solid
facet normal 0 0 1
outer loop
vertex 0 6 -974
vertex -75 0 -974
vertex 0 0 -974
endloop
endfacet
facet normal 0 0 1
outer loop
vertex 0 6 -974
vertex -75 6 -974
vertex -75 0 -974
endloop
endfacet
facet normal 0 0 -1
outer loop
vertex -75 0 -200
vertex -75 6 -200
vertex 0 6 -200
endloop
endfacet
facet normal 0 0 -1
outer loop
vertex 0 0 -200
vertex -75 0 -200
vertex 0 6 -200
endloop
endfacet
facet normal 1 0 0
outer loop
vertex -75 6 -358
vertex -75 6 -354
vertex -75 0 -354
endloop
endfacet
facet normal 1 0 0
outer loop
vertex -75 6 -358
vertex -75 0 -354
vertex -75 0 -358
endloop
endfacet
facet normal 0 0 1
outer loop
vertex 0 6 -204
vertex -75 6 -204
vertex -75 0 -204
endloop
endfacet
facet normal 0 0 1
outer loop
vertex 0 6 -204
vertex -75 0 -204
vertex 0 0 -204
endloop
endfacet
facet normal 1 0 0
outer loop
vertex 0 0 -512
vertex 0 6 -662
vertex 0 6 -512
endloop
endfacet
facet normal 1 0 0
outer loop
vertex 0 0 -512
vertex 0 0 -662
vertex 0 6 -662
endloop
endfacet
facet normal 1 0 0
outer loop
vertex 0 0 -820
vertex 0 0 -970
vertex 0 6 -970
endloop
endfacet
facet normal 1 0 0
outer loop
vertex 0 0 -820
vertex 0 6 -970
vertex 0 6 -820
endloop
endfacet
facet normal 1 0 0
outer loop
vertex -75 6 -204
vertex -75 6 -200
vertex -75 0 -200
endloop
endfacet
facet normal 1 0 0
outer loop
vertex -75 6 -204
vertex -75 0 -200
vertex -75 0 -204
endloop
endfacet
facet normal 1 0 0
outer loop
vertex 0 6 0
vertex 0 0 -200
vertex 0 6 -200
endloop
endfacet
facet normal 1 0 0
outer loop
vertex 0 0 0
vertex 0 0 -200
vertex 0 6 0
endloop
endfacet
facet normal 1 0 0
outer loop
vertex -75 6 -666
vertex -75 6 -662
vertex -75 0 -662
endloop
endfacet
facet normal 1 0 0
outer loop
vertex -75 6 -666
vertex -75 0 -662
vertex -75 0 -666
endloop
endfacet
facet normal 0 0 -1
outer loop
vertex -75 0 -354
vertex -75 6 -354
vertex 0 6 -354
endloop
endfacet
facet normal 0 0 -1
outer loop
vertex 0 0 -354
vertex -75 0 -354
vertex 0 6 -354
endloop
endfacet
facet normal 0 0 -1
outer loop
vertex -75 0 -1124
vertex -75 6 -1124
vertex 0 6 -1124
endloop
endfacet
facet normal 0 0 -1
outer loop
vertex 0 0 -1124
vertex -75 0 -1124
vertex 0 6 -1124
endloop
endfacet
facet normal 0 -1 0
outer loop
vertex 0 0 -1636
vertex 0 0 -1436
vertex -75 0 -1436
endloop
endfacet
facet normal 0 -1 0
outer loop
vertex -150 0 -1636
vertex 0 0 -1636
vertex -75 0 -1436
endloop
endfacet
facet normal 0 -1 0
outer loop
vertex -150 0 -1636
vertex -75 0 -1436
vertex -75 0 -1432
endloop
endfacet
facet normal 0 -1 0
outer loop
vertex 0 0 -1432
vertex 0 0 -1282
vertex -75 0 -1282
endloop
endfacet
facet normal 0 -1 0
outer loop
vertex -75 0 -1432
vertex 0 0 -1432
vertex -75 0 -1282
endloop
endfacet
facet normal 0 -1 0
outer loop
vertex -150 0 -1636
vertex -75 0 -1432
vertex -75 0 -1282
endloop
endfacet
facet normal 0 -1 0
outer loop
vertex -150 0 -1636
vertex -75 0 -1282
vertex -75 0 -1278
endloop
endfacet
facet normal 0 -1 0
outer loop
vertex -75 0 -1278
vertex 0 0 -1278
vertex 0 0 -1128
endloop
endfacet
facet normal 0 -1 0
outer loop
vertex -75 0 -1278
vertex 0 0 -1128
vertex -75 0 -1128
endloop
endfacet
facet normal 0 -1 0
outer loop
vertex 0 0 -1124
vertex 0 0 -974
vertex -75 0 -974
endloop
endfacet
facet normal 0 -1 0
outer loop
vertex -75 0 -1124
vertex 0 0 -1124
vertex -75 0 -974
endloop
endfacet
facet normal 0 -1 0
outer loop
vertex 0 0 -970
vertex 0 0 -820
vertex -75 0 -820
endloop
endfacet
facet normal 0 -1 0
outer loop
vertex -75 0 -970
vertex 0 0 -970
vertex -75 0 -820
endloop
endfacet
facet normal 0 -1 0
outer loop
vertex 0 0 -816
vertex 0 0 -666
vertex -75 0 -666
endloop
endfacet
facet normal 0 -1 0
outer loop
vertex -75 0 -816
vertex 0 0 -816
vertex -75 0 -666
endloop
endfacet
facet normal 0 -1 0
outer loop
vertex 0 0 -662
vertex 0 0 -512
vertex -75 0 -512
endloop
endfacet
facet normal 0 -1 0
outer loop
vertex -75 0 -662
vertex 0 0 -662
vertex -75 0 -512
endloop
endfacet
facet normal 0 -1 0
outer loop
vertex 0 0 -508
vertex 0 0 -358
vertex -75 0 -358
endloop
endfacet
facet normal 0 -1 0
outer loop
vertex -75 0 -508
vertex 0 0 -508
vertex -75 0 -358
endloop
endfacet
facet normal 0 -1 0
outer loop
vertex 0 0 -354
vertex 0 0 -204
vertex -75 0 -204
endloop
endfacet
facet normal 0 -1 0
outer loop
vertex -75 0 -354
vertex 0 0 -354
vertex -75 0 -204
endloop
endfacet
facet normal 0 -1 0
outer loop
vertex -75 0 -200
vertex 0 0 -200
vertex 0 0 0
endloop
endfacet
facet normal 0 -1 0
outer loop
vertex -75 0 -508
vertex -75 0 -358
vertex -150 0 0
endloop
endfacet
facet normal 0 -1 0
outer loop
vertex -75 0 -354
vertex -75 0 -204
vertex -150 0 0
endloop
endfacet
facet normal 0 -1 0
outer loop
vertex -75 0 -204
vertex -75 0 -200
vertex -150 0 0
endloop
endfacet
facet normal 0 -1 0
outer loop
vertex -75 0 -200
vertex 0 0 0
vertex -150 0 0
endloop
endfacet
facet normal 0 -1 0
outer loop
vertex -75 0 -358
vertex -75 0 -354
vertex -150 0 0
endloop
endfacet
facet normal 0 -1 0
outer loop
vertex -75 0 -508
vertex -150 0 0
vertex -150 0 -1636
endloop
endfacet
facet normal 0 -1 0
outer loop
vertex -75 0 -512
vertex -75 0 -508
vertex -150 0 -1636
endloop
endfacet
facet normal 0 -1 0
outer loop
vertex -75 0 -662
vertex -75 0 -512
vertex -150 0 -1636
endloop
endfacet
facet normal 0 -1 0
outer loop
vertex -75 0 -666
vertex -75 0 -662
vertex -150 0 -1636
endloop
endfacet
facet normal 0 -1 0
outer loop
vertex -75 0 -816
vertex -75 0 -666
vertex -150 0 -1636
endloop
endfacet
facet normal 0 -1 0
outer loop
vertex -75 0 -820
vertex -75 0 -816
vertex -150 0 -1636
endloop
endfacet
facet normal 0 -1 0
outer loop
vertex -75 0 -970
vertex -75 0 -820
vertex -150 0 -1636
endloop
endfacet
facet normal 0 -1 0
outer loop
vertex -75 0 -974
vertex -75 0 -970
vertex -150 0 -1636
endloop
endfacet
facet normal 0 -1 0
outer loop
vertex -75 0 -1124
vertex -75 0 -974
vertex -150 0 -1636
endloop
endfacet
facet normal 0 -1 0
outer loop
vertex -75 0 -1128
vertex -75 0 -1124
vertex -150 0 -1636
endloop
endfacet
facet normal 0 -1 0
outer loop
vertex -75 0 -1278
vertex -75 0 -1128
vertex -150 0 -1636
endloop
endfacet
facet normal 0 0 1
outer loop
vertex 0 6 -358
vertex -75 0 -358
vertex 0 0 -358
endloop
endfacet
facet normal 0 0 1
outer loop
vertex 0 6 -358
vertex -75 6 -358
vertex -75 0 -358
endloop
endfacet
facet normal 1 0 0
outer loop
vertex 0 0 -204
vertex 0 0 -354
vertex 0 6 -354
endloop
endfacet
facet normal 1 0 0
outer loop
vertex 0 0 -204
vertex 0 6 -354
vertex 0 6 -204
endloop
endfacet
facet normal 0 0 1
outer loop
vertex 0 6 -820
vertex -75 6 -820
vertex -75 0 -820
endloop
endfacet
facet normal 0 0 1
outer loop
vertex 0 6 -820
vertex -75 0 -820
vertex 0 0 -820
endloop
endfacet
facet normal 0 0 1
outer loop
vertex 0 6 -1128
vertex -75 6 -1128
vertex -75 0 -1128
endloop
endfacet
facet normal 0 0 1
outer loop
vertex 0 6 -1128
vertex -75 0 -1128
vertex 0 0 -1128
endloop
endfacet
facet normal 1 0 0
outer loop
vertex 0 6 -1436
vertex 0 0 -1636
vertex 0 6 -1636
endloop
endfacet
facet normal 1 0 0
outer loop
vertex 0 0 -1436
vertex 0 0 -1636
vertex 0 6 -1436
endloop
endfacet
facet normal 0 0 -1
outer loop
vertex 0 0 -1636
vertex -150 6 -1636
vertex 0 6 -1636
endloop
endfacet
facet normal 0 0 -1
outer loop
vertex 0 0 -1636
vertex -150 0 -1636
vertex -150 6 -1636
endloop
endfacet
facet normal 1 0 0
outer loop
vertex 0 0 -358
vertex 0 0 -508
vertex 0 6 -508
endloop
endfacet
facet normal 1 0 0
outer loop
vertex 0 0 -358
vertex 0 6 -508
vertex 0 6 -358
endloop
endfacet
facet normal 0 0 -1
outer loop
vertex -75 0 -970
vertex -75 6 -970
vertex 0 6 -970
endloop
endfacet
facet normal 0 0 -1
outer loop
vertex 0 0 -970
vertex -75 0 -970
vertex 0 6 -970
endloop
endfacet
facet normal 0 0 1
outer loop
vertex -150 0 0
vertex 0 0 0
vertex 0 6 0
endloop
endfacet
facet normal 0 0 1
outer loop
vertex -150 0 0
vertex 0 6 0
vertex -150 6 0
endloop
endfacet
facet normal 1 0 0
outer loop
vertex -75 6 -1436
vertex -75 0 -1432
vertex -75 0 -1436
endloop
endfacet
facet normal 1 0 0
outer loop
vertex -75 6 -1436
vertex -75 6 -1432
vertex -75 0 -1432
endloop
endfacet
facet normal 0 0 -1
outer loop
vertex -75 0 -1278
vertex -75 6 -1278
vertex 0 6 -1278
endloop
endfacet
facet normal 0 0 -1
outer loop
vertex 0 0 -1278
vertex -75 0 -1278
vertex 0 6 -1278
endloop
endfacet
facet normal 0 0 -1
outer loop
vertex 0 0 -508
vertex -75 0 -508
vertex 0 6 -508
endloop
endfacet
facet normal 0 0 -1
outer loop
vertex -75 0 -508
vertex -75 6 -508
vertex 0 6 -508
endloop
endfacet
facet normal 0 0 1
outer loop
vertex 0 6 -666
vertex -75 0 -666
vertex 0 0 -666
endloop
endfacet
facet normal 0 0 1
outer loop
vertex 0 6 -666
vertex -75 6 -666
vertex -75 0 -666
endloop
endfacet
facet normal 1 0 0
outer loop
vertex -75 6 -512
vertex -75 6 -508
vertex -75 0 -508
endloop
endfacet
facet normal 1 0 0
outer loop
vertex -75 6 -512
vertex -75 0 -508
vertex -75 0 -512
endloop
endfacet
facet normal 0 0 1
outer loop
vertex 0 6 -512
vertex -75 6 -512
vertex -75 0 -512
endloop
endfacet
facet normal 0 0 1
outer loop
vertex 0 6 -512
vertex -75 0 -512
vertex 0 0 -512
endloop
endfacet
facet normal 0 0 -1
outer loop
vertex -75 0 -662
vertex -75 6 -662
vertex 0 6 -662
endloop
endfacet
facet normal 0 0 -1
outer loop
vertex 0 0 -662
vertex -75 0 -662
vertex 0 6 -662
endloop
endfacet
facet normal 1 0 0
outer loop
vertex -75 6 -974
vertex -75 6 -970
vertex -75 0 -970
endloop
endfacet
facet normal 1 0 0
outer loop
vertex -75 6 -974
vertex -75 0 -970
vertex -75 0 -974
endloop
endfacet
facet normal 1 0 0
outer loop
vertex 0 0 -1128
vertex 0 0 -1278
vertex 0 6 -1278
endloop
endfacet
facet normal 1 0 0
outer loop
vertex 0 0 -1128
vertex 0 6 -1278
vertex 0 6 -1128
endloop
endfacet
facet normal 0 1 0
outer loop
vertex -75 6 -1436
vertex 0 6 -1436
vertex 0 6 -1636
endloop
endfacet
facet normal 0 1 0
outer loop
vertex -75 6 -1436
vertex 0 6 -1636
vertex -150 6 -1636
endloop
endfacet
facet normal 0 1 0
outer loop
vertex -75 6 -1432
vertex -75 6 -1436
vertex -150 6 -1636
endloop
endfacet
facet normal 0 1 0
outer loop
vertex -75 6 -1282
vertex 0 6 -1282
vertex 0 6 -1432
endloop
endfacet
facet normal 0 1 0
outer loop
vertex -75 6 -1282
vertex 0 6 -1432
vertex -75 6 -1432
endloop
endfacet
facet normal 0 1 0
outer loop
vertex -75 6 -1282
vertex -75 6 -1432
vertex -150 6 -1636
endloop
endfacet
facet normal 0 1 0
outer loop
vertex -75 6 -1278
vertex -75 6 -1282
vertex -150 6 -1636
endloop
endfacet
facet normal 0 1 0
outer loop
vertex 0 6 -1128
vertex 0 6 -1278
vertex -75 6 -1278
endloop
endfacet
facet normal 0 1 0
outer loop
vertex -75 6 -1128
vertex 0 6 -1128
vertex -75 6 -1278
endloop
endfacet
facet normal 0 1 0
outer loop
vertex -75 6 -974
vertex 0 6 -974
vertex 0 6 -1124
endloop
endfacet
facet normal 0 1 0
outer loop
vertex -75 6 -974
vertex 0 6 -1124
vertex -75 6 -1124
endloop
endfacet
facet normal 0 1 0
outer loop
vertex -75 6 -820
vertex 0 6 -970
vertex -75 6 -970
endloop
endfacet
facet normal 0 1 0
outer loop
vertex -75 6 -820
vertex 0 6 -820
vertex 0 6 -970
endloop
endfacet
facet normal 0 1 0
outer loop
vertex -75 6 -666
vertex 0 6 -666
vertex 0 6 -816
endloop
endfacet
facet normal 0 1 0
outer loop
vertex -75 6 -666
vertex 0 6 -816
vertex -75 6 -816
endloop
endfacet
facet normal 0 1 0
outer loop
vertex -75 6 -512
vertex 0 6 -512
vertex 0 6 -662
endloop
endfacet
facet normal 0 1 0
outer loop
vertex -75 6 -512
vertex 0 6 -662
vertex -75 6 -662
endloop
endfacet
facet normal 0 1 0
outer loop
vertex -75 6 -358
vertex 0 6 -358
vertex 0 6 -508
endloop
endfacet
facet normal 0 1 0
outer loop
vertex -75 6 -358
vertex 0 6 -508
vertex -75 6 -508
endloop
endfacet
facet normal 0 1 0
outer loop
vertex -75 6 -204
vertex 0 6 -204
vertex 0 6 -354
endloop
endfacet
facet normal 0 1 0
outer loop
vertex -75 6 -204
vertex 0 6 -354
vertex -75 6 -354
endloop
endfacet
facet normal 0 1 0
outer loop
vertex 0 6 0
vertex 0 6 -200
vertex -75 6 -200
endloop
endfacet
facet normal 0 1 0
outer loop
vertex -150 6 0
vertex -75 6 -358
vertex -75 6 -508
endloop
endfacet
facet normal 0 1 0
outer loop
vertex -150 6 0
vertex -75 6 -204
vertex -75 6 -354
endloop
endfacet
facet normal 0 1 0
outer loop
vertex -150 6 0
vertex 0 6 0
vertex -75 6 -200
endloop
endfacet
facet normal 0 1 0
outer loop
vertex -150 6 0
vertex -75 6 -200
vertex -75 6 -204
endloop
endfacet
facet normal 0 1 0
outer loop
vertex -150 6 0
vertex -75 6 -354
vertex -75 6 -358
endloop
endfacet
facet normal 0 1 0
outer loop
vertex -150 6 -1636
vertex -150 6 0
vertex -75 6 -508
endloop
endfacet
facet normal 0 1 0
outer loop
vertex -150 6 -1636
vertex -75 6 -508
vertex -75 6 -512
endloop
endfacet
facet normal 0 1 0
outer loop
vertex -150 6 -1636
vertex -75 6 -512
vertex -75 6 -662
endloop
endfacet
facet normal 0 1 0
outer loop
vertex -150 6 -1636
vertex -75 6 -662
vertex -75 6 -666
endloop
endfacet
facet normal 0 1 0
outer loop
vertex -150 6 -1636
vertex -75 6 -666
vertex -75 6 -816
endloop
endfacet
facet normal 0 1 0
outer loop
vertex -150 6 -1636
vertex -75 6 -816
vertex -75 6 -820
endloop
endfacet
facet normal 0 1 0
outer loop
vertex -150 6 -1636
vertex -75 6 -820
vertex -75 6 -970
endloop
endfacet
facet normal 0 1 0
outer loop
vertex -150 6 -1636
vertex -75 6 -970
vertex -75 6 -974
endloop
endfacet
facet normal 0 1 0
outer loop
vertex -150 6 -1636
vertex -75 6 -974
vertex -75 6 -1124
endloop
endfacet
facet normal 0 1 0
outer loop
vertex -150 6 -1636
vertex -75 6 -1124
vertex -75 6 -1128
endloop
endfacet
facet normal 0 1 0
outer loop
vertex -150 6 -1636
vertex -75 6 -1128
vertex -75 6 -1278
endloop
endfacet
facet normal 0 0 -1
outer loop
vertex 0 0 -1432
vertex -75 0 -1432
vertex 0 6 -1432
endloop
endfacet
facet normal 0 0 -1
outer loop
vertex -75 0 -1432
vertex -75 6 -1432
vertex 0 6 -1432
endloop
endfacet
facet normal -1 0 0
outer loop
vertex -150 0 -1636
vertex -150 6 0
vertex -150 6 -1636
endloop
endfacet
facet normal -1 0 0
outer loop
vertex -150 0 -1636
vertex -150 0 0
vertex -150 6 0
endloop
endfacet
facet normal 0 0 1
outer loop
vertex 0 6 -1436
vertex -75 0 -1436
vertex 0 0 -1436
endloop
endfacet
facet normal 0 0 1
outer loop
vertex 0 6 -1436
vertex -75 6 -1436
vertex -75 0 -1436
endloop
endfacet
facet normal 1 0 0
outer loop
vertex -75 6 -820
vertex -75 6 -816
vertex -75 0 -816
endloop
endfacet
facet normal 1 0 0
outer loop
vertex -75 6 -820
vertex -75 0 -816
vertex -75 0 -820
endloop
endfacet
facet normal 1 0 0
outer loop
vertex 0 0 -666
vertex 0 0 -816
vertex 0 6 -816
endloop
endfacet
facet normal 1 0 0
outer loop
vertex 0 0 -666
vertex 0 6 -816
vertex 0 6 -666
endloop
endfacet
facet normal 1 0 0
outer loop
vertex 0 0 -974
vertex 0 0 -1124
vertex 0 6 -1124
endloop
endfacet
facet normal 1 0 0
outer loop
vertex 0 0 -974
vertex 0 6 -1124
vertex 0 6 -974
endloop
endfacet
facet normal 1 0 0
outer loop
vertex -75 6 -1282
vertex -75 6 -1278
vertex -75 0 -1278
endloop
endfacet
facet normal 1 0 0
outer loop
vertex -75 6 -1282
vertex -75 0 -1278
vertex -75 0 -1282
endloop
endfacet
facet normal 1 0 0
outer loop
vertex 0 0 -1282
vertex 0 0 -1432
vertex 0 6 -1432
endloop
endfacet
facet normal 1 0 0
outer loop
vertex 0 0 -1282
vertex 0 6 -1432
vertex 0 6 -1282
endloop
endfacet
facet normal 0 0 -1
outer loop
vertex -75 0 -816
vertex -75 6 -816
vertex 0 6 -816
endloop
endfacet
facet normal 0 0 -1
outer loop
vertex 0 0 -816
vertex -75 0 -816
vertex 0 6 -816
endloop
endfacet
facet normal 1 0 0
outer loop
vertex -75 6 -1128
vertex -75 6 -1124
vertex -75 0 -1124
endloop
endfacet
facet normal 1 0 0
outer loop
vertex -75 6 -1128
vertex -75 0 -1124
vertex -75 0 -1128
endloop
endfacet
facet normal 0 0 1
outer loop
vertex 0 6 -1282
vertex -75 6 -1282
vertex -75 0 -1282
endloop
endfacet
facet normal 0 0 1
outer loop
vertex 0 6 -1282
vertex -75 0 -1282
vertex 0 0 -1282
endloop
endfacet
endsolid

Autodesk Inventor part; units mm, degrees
ref_plane "YZ Plane" through (0, 0, 0) normal (1, 0, 0) x (0, 1, 0)
ref_plane "XZ Plane" through (0, 0, 0) normal (0, 1, 0) x (-1, 0, 0)
ref_plane "XY Plane" through (0, 0, 0) normal (0, 0, 1) x (1, 0, 0)
sketch "Sketch1" plane through (0, 0, 0) normal (0, 1, 0) x (-1, 0, 0)
  line L0 (0, 0) -> (150, 0)
  line L1 (150, 0) -> (150, -1636)
  line L2 (150, -1636) -> (0, -1636)
  line L3 (0, -1636) -> (0, 0)
  dimension "d0" = 150
  dimension "d1" = 1636
extrude "Extrusion1" add sketch "Sketch1" along normal blind 6
sketch "Sketch2" plane through (0, 6, 0) normal (0, 1, 0) x (1, 0, 0)
  line L0 (-150, 200) -> (0, 200)
  line L1 (-150, 0) -> (0, 0) projected
  line L2 (-150, 204) -> (0, 204)
  line L3 (-75, 200) -> (-75, 204)
  line L4 (-150, 354) -> (0, 354)
  line L5 (-150, 358) -> (0, 358)
  line L6 (-75, 354) -> (-75, 358)
  line L7 (-150, 508) -> (0, 508)
  line L8 (-150, 512) -> (0, 512)
  line L9 (-75, 508) -> (-75, 512)
  line L10 (-150, 662) -> (0, 662)
  line L11 (-150, 666) -> (0, 666)
  line L12 (-75, 662) -> (-75, 666)
  line L13 (-150, 816) -> (0, 816)
  line L14 (-150, 820) -> (0, 820)
  line L15 (-75, 816) -> (-75, 820)
  line L16 (-150, 970) -> (0, 970)
  line L17 (-150, 974) -> (0, 974)
  line L18 (-75, 970) -> (-75, 974)
  line L19 (-150, 1436) -> (0, 1436)
  line L20 (-150, 1432) -> (0, 1432)
  line L21 (-150, 1282) -> (0, 1282)
  line L22 (-150, 1278) -> (0, 1278)
  line L23 (-150, 1128) -> (0, 1128)
  line L24 (-150, 1124) -> (0, 1124)
  line L25 (-75, 1124) -> (-75, 1128)
  line L26 (-75, 1278) -> (-75, 1282)
  line L27 (-75, 1432) -> (-75, 1436)
  line L28 (0, 0) -> (0, 1636) projected
  line L29 (0, 0) -> (0, 1636)
  dimension "d4" = 200
  dimension "d5" = 4
  dimension "d6" = 150
  dimension "d7" = 4
  dimension "d8" = 150
  dimension "d9" = 4
  dimension "d10" = 150
  dimension "d11" = 4
  dimension "d12" = 150
  dimension "d13" = 4
  dimension "d14" = 150
  dimension "d15" = 4
  dimension "d19" = 150
  dimension "d21" = 150
  dimension "d22" = 150
  dimension "d40" = 4
  dimension "d41" = 4
  dimension "d42" = 4
extrude "Extrusion2" cut sketch "Sketch2" against normal blind 6
properties part number "Base" material "Wood (Cherry)"
